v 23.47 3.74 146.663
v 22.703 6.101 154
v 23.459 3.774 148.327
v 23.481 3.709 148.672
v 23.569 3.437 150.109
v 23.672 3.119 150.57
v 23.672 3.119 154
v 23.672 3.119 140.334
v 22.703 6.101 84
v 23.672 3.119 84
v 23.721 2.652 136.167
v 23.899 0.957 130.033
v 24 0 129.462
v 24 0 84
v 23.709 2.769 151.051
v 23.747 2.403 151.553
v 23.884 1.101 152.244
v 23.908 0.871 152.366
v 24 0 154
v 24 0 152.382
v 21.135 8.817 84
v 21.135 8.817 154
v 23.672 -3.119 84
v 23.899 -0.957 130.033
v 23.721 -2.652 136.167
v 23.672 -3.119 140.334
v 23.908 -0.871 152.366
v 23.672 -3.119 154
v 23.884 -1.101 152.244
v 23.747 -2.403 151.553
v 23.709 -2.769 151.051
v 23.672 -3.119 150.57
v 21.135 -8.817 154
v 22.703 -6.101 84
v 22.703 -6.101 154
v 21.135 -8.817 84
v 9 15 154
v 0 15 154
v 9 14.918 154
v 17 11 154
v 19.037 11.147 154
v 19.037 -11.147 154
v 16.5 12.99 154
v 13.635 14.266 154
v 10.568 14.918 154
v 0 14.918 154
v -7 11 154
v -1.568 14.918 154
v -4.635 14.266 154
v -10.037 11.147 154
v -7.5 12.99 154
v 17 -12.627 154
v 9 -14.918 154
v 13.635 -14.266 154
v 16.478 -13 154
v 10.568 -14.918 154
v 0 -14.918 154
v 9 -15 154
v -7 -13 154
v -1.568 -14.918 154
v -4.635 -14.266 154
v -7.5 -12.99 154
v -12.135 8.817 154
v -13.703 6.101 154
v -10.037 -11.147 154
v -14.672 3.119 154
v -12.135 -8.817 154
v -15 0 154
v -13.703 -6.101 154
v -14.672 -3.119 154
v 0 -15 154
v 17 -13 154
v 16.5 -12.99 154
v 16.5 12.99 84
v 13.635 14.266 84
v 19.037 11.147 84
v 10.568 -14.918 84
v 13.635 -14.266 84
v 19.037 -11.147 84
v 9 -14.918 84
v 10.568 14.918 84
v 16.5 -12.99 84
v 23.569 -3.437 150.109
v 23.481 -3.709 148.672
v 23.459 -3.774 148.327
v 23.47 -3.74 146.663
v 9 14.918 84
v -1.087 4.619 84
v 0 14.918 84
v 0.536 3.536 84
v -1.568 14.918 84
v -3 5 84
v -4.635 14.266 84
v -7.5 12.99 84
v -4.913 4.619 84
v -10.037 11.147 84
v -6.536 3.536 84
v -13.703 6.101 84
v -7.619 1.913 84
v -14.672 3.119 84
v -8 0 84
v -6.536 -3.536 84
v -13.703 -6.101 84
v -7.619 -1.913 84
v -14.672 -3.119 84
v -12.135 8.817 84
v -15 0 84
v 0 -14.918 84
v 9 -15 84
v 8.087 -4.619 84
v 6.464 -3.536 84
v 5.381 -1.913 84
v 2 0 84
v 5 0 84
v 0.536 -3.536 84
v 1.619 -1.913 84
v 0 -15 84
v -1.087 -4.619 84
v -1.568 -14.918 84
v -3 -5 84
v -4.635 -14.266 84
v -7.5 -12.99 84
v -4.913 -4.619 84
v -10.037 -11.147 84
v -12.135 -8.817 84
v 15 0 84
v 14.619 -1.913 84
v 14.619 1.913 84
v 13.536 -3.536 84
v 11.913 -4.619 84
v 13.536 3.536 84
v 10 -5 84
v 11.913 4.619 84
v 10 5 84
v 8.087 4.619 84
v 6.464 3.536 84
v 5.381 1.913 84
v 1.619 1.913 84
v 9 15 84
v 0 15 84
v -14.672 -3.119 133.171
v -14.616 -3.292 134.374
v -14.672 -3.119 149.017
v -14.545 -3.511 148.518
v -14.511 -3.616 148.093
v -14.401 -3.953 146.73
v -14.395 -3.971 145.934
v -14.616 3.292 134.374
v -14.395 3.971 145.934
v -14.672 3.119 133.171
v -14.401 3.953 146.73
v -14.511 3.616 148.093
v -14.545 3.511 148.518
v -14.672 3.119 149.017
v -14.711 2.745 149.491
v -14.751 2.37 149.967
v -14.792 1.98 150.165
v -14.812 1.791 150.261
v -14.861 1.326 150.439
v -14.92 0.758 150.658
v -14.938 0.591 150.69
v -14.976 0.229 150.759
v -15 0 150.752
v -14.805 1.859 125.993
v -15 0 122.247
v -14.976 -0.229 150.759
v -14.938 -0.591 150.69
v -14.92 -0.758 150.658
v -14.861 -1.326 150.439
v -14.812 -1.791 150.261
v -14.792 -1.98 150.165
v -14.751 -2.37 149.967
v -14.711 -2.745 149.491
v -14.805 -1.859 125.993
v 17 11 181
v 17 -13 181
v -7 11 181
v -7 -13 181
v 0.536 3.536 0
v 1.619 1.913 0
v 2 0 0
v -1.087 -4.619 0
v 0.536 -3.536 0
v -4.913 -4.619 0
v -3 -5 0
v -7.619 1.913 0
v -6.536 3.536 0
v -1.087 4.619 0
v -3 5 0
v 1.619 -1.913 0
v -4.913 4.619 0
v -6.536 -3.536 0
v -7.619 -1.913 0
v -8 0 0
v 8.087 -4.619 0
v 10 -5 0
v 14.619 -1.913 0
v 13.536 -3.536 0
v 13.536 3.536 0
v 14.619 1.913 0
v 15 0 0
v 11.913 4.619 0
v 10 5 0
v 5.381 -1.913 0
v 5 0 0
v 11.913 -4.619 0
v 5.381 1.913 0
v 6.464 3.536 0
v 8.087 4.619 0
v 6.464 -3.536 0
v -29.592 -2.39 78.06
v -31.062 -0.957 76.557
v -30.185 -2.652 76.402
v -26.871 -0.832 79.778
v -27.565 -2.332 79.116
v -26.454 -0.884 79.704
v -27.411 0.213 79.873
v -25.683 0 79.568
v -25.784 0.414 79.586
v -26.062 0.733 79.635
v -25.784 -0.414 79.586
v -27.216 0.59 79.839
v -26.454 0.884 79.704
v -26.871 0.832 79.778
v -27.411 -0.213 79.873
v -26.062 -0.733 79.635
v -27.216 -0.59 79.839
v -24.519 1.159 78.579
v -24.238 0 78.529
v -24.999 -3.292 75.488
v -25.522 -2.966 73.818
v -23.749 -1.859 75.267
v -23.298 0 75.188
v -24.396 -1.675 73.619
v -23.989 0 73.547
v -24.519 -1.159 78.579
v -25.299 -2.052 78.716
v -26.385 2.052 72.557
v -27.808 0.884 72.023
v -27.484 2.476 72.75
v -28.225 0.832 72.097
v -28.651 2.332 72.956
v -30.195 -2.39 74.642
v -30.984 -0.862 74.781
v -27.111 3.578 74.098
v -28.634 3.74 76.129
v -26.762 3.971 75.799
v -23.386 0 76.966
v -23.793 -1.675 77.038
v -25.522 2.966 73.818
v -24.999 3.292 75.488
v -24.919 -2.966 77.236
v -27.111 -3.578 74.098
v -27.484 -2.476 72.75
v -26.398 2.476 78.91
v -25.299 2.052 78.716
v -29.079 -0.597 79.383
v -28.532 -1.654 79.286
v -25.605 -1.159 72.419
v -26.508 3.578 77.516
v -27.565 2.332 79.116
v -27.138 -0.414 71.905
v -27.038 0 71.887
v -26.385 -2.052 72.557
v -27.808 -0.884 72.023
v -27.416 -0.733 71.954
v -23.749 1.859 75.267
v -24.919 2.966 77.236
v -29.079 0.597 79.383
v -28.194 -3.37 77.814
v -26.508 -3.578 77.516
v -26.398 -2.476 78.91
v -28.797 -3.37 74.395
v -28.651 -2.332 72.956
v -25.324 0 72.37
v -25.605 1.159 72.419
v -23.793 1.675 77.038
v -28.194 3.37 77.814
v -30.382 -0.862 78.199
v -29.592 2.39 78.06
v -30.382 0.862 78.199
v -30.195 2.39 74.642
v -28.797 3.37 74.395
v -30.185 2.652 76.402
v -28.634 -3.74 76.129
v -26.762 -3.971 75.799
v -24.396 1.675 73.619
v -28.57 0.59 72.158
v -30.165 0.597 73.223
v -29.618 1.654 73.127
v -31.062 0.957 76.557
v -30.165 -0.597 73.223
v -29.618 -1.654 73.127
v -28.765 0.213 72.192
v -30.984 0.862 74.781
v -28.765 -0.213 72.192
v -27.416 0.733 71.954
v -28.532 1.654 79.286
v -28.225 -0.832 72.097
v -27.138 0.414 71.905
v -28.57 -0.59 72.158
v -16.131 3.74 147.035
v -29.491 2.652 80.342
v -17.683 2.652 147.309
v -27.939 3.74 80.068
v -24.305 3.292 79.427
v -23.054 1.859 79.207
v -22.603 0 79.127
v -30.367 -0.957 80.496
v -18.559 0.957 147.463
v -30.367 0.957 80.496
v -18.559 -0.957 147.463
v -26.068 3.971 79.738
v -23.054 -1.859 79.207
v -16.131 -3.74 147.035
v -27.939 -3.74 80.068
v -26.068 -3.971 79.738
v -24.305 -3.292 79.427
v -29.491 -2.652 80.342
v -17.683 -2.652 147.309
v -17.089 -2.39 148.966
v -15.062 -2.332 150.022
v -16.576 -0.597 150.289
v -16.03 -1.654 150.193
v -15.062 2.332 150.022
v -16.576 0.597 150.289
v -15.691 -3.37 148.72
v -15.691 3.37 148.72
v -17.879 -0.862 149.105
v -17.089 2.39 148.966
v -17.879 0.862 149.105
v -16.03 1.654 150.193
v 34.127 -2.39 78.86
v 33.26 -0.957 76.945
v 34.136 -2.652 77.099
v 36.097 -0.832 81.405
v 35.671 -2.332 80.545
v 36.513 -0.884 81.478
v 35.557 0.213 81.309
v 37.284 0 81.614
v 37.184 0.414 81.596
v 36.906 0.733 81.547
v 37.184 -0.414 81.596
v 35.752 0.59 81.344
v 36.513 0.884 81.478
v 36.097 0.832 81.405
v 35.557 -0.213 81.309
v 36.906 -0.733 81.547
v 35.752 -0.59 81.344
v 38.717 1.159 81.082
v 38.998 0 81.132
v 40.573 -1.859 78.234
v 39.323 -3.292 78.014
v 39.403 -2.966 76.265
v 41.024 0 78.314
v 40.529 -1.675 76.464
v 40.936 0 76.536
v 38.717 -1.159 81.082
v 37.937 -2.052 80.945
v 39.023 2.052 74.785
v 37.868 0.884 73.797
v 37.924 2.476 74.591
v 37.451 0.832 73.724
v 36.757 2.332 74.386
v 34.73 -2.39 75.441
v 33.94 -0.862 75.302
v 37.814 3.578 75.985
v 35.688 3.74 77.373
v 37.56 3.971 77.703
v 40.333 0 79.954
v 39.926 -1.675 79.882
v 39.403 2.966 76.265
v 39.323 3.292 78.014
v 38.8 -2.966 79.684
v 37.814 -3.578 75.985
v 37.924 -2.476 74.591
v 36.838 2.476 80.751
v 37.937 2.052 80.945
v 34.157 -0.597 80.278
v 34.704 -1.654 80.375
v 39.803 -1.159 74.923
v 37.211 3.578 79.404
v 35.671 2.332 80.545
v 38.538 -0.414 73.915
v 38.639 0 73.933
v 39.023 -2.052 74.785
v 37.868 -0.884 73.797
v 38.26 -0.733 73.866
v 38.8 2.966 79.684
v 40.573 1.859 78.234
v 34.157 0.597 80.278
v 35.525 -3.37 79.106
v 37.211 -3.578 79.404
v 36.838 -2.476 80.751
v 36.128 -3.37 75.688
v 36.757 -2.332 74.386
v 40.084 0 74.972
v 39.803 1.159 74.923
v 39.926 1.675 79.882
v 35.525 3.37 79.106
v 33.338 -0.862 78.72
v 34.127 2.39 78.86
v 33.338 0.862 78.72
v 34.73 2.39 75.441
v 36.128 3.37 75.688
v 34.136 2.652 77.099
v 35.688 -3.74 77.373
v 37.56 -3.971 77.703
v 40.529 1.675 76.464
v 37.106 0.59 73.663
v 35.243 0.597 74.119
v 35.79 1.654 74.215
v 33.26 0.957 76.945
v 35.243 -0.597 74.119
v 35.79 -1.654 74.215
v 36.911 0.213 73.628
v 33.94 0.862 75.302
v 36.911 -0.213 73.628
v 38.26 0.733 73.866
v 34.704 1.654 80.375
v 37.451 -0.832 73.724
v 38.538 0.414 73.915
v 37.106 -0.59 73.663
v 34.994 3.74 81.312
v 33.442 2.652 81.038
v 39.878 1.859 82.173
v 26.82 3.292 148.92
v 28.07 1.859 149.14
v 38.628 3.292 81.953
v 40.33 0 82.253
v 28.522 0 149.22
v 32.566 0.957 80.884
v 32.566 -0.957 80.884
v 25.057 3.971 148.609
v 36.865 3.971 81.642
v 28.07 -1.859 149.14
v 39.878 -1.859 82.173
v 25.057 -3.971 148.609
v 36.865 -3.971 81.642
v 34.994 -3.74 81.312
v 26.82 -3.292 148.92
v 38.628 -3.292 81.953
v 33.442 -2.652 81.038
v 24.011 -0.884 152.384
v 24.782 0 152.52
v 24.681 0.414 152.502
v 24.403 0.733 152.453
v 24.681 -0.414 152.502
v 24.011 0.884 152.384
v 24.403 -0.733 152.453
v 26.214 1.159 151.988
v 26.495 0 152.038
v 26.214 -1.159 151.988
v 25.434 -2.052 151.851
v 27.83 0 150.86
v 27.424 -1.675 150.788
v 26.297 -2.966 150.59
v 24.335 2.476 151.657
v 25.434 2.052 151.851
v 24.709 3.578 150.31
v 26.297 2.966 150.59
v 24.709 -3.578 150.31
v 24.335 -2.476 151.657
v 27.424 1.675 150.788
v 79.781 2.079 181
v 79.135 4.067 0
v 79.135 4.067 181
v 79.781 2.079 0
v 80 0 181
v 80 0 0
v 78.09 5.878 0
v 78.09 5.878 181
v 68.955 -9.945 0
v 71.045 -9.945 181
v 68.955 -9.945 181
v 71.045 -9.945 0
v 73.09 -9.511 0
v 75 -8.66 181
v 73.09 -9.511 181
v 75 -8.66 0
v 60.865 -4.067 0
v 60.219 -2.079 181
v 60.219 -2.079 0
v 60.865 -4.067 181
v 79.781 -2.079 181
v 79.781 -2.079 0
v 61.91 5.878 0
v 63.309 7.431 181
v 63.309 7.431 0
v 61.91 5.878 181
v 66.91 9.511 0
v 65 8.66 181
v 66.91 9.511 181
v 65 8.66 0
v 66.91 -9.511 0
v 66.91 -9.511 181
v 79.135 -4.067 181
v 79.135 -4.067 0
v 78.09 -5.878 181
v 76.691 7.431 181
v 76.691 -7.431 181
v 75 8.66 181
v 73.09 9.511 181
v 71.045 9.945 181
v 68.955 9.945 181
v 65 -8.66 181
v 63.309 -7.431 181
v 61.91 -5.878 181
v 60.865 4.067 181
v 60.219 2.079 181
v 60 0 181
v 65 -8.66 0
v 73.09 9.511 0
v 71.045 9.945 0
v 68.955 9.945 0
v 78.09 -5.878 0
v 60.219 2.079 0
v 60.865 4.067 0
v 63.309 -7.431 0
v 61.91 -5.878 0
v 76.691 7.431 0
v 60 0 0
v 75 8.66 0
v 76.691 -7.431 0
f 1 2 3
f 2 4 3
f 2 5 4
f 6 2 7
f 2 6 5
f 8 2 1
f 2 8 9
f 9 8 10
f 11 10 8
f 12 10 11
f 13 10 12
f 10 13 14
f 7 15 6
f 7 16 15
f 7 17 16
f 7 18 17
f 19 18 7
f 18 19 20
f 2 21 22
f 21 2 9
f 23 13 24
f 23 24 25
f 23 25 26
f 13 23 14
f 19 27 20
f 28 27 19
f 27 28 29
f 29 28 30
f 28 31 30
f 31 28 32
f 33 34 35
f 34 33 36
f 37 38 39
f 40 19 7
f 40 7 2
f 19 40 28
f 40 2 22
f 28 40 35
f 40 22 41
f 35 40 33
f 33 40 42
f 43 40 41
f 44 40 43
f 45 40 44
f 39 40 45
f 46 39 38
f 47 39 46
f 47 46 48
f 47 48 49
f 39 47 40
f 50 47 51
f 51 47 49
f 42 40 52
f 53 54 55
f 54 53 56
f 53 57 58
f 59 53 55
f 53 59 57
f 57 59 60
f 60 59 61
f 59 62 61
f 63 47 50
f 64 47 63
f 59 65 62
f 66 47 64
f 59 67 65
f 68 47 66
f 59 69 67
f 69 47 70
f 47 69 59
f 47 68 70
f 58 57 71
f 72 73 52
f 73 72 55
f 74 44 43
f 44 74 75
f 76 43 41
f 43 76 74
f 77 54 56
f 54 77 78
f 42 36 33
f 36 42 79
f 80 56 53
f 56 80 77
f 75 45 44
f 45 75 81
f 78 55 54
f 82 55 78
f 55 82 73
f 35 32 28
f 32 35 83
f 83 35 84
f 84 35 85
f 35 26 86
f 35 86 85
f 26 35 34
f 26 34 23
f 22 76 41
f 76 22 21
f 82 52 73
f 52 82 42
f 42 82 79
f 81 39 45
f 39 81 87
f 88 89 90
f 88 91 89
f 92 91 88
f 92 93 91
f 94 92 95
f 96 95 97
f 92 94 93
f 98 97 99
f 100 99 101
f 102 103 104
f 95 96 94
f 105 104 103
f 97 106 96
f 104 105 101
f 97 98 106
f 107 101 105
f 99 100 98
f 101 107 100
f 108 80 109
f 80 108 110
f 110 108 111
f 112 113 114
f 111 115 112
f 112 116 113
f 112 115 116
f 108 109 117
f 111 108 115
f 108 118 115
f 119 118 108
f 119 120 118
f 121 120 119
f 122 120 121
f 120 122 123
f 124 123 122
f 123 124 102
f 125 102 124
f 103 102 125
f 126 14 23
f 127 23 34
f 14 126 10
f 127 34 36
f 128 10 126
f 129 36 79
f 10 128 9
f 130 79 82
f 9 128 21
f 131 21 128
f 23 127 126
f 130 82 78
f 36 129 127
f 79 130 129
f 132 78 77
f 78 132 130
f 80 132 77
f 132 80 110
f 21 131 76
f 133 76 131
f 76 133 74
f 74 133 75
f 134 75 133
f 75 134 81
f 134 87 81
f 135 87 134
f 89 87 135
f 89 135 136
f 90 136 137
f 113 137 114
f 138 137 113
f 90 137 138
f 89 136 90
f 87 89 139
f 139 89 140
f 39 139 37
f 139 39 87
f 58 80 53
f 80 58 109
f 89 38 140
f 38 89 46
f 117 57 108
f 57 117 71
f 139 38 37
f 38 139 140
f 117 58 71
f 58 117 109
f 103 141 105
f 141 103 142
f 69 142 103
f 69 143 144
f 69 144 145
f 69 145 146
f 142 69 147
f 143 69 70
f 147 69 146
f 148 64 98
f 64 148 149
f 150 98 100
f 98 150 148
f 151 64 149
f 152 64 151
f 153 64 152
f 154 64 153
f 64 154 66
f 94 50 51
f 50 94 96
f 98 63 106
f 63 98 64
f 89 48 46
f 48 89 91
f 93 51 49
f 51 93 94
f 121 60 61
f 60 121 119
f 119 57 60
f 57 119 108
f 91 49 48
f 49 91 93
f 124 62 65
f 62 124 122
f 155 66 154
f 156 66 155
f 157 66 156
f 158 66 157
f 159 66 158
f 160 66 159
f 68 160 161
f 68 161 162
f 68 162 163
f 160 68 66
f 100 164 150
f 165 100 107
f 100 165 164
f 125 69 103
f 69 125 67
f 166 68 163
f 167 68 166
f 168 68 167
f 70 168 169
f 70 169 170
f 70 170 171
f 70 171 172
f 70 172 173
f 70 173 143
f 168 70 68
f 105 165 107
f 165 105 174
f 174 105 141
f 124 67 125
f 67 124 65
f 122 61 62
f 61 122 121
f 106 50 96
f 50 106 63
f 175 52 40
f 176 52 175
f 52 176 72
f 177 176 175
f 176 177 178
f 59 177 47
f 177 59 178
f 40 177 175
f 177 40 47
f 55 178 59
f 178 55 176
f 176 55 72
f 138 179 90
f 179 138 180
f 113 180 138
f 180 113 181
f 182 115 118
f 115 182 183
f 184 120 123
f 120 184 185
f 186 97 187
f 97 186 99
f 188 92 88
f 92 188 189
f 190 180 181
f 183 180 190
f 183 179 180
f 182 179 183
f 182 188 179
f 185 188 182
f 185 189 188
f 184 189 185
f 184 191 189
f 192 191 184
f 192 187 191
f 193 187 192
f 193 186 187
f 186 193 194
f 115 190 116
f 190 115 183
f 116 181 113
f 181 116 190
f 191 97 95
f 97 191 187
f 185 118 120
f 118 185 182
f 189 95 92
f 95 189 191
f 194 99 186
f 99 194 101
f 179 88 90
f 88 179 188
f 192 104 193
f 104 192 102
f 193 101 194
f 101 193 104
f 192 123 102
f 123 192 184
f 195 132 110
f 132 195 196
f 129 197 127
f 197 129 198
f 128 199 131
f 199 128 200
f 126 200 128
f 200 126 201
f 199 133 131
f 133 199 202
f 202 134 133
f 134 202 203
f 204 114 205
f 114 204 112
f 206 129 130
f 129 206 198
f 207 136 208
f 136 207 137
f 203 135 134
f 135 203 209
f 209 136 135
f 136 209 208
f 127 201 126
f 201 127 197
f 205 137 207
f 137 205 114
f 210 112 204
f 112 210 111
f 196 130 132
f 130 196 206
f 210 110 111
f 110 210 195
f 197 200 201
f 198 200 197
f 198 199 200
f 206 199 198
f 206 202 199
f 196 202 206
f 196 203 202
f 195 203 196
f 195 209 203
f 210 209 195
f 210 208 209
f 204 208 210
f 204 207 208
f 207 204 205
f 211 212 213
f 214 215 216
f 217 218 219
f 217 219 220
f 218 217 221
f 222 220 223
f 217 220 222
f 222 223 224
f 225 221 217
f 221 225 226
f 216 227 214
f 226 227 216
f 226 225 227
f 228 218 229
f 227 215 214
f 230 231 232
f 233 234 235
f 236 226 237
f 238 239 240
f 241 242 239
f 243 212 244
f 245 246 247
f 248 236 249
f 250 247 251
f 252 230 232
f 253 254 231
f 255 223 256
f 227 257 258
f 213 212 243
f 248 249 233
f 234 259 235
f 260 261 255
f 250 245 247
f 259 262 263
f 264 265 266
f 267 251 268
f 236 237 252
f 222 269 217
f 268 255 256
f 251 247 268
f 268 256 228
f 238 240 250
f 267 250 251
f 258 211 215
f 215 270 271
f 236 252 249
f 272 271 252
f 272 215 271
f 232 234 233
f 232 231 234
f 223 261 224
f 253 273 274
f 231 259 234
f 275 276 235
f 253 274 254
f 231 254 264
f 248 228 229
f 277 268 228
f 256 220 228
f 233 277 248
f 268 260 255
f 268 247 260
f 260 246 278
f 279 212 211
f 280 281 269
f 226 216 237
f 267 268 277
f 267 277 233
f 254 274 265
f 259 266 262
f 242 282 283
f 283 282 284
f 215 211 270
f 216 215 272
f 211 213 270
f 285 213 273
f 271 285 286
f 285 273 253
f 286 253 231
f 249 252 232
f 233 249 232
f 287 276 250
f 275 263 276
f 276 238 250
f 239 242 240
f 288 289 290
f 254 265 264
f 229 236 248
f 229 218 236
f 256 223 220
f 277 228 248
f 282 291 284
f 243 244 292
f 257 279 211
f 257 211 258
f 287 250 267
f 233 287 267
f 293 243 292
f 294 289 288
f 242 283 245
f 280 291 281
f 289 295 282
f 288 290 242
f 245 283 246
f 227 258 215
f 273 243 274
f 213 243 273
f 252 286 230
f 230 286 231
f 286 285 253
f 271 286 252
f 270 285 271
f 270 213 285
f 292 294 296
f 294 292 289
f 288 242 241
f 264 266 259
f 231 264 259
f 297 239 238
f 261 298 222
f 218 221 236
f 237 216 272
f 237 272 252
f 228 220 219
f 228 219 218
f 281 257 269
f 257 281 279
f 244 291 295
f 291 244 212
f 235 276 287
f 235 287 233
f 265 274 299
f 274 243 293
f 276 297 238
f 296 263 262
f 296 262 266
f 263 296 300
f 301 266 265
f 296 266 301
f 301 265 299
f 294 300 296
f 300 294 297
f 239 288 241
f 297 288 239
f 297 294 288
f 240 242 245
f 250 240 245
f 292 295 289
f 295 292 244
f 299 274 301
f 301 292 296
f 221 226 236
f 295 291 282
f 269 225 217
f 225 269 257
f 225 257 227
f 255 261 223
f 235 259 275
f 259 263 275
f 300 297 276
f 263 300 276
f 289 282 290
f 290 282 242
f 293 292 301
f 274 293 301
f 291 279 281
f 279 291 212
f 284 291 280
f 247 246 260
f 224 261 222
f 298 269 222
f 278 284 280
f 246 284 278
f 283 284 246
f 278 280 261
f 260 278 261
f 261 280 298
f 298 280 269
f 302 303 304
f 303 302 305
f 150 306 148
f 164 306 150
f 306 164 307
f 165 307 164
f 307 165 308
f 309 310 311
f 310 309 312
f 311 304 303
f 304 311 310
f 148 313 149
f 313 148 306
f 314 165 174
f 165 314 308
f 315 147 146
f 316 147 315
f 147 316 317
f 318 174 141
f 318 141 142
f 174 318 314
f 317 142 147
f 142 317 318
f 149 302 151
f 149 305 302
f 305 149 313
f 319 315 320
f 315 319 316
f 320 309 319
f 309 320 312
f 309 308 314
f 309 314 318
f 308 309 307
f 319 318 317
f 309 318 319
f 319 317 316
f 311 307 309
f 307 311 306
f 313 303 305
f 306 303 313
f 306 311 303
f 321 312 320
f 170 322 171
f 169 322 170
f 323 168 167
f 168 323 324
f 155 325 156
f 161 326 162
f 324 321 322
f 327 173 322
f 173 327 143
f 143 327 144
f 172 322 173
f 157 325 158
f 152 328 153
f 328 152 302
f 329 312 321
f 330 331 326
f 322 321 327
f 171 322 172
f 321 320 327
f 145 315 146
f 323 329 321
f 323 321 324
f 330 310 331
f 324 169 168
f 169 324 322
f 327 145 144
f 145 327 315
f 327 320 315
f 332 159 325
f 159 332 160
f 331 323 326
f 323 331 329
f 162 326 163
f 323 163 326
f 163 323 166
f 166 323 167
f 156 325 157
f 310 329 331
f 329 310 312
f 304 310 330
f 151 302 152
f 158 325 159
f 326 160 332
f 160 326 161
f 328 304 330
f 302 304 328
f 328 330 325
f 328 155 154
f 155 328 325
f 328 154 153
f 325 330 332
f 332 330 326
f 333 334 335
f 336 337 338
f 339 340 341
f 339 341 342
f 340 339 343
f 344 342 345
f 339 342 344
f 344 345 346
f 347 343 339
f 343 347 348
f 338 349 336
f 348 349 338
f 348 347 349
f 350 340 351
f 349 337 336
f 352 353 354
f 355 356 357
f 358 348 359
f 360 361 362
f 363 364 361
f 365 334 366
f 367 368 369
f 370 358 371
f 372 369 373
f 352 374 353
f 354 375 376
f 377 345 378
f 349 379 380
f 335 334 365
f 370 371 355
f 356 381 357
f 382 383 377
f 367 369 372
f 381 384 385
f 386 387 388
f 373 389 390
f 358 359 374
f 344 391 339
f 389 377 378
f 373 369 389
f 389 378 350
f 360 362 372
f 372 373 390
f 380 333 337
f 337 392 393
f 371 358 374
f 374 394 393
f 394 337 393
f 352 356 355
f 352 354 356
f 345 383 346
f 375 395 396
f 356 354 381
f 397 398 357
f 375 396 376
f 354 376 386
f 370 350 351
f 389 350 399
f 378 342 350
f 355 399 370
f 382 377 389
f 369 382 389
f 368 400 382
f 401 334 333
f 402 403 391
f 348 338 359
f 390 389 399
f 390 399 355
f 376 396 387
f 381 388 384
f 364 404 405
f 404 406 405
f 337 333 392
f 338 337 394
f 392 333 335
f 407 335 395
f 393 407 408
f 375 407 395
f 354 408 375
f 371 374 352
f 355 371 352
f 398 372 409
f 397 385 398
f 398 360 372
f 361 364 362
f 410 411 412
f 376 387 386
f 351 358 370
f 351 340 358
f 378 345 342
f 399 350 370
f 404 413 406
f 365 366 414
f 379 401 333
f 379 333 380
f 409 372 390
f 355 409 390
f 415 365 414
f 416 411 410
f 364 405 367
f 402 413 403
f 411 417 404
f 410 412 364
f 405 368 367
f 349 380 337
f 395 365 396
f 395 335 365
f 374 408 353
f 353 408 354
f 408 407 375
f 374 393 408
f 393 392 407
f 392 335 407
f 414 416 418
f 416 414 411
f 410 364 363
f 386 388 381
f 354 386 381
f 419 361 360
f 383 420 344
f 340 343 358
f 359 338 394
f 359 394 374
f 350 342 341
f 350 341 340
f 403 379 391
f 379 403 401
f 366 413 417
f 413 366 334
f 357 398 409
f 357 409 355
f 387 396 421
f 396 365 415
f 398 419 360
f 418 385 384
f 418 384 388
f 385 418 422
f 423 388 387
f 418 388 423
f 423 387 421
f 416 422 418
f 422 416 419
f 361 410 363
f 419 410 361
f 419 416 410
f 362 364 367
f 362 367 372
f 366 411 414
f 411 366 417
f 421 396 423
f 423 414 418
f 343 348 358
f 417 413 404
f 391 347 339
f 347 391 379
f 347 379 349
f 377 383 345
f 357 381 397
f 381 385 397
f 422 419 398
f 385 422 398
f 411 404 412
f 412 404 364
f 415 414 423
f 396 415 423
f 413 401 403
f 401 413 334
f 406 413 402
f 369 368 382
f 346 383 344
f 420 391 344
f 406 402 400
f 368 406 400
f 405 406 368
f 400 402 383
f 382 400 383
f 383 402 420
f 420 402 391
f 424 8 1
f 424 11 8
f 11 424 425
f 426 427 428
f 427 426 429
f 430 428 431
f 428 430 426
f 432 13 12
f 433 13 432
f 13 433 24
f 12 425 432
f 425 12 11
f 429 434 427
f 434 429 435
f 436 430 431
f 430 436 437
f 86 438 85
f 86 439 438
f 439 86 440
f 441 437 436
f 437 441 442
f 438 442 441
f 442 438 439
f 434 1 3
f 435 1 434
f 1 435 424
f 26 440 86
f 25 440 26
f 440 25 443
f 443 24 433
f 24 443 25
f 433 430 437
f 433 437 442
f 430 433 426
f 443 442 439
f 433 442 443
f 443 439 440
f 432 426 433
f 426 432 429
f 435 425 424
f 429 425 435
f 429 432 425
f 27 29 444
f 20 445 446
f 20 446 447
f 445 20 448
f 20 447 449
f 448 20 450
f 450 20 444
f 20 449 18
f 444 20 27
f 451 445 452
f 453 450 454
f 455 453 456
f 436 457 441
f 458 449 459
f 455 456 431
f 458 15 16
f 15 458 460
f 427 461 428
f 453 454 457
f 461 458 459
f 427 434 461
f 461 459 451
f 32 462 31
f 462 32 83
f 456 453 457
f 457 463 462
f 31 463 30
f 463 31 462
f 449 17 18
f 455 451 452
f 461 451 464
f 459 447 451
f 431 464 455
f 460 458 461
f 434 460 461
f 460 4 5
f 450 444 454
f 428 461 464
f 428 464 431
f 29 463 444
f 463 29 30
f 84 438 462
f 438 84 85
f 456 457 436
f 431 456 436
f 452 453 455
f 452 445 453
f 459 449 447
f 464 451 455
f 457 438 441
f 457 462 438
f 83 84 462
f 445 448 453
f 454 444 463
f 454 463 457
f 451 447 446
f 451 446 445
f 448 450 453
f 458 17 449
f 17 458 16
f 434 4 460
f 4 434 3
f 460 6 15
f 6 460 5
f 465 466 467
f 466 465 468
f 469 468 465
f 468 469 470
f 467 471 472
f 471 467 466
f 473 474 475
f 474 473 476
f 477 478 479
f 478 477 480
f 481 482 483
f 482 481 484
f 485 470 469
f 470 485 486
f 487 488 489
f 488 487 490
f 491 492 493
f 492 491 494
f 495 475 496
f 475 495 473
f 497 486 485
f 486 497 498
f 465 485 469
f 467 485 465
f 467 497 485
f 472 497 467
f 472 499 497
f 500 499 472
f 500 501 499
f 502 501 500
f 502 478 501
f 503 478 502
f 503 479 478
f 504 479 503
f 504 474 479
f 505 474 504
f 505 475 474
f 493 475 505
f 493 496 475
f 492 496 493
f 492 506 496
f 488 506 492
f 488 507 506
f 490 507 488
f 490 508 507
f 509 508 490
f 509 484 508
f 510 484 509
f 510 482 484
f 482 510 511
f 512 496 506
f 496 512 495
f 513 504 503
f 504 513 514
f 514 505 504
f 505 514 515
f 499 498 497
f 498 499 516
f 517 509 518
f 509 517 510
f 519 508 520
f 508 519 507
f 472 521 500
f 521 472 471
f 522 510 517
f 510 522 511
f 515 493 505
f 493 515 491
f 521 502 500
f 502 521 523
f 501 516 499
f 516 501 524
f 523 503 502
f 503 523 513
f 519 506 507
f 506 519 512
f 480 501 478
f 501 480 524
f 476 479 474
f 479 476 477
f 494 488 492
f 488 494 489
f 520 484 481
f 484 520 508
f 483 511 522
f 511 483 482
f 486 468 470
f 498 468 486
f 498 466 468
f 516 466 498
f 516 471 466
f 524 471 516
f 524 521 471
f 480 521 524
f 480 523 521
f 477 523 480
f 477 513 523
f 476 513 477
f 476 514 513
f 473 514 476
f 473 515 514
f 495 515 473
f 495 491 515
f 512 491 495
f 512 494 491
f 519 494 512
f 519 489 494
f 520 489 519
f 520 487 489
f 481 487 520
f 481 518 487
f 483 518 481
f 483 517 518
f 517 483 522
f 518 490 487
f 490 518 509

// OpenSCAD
union() {
	color(c = [0, 0, 0]) {
		translate(v = [70, 0, 0]) {
			cylinder(h = 181, r = 10);
		}
	}
	color(c = [0.1000000000, 0.9000000000, 0.1000000000]) {
		union() {
			union() {
				translate(v = [0, 0, 84]) {
					union() {
						cylinder(h = 70, r = 15);
						union() {
							translate(v = [9, 0, 0]) {
								cylinder(h = 70, r = 15);
							}
							translate(v = [0, -15, 0]) {
								cube(size = [9, 30, 70]);
							}
						}
					}
				}
				translate(v = [-7, -13, 154]) {
					cube(size = [24, 24, 27]);
				}
			}
			union() {
				union() {
					translate(v = [-3, 0, 0]) {
						cylinder(h = 84, r = 5);
					}
					translate(v = [13, 0, 0]) {
						translate(v = [-3, 0, 0]) {
							cylinder(h = 84, r = 5);
						}
					}
				}
				union() {
					rotate(a = [0, 10, 0]) {
						translate(v = [-40, 0, 70]) {
							union() {
								union() {
									sphere(r = 4);
									translate(v = [0, 0, 4]) {
										cylinder(h = 68, r = 4);
									}
								}
								translate(v = [0, 0, 72]) {
									sphere(r = 4);
								}
							}
						}
					}
					rotate(a = [0, -10, 0]) {
						translate(v = [50, 0, 70]) {
							union() {
								union() {
									sphere(r = 4);
									translate(v = [0, 0, 4]) {
										cylinder(h = 68, r = 4);
									}
								}
								translate(v = [0, 0, 72]) {
									sphere(r = 4);
								}
							}
						}
					}
				}
			}
		}
	}
}
